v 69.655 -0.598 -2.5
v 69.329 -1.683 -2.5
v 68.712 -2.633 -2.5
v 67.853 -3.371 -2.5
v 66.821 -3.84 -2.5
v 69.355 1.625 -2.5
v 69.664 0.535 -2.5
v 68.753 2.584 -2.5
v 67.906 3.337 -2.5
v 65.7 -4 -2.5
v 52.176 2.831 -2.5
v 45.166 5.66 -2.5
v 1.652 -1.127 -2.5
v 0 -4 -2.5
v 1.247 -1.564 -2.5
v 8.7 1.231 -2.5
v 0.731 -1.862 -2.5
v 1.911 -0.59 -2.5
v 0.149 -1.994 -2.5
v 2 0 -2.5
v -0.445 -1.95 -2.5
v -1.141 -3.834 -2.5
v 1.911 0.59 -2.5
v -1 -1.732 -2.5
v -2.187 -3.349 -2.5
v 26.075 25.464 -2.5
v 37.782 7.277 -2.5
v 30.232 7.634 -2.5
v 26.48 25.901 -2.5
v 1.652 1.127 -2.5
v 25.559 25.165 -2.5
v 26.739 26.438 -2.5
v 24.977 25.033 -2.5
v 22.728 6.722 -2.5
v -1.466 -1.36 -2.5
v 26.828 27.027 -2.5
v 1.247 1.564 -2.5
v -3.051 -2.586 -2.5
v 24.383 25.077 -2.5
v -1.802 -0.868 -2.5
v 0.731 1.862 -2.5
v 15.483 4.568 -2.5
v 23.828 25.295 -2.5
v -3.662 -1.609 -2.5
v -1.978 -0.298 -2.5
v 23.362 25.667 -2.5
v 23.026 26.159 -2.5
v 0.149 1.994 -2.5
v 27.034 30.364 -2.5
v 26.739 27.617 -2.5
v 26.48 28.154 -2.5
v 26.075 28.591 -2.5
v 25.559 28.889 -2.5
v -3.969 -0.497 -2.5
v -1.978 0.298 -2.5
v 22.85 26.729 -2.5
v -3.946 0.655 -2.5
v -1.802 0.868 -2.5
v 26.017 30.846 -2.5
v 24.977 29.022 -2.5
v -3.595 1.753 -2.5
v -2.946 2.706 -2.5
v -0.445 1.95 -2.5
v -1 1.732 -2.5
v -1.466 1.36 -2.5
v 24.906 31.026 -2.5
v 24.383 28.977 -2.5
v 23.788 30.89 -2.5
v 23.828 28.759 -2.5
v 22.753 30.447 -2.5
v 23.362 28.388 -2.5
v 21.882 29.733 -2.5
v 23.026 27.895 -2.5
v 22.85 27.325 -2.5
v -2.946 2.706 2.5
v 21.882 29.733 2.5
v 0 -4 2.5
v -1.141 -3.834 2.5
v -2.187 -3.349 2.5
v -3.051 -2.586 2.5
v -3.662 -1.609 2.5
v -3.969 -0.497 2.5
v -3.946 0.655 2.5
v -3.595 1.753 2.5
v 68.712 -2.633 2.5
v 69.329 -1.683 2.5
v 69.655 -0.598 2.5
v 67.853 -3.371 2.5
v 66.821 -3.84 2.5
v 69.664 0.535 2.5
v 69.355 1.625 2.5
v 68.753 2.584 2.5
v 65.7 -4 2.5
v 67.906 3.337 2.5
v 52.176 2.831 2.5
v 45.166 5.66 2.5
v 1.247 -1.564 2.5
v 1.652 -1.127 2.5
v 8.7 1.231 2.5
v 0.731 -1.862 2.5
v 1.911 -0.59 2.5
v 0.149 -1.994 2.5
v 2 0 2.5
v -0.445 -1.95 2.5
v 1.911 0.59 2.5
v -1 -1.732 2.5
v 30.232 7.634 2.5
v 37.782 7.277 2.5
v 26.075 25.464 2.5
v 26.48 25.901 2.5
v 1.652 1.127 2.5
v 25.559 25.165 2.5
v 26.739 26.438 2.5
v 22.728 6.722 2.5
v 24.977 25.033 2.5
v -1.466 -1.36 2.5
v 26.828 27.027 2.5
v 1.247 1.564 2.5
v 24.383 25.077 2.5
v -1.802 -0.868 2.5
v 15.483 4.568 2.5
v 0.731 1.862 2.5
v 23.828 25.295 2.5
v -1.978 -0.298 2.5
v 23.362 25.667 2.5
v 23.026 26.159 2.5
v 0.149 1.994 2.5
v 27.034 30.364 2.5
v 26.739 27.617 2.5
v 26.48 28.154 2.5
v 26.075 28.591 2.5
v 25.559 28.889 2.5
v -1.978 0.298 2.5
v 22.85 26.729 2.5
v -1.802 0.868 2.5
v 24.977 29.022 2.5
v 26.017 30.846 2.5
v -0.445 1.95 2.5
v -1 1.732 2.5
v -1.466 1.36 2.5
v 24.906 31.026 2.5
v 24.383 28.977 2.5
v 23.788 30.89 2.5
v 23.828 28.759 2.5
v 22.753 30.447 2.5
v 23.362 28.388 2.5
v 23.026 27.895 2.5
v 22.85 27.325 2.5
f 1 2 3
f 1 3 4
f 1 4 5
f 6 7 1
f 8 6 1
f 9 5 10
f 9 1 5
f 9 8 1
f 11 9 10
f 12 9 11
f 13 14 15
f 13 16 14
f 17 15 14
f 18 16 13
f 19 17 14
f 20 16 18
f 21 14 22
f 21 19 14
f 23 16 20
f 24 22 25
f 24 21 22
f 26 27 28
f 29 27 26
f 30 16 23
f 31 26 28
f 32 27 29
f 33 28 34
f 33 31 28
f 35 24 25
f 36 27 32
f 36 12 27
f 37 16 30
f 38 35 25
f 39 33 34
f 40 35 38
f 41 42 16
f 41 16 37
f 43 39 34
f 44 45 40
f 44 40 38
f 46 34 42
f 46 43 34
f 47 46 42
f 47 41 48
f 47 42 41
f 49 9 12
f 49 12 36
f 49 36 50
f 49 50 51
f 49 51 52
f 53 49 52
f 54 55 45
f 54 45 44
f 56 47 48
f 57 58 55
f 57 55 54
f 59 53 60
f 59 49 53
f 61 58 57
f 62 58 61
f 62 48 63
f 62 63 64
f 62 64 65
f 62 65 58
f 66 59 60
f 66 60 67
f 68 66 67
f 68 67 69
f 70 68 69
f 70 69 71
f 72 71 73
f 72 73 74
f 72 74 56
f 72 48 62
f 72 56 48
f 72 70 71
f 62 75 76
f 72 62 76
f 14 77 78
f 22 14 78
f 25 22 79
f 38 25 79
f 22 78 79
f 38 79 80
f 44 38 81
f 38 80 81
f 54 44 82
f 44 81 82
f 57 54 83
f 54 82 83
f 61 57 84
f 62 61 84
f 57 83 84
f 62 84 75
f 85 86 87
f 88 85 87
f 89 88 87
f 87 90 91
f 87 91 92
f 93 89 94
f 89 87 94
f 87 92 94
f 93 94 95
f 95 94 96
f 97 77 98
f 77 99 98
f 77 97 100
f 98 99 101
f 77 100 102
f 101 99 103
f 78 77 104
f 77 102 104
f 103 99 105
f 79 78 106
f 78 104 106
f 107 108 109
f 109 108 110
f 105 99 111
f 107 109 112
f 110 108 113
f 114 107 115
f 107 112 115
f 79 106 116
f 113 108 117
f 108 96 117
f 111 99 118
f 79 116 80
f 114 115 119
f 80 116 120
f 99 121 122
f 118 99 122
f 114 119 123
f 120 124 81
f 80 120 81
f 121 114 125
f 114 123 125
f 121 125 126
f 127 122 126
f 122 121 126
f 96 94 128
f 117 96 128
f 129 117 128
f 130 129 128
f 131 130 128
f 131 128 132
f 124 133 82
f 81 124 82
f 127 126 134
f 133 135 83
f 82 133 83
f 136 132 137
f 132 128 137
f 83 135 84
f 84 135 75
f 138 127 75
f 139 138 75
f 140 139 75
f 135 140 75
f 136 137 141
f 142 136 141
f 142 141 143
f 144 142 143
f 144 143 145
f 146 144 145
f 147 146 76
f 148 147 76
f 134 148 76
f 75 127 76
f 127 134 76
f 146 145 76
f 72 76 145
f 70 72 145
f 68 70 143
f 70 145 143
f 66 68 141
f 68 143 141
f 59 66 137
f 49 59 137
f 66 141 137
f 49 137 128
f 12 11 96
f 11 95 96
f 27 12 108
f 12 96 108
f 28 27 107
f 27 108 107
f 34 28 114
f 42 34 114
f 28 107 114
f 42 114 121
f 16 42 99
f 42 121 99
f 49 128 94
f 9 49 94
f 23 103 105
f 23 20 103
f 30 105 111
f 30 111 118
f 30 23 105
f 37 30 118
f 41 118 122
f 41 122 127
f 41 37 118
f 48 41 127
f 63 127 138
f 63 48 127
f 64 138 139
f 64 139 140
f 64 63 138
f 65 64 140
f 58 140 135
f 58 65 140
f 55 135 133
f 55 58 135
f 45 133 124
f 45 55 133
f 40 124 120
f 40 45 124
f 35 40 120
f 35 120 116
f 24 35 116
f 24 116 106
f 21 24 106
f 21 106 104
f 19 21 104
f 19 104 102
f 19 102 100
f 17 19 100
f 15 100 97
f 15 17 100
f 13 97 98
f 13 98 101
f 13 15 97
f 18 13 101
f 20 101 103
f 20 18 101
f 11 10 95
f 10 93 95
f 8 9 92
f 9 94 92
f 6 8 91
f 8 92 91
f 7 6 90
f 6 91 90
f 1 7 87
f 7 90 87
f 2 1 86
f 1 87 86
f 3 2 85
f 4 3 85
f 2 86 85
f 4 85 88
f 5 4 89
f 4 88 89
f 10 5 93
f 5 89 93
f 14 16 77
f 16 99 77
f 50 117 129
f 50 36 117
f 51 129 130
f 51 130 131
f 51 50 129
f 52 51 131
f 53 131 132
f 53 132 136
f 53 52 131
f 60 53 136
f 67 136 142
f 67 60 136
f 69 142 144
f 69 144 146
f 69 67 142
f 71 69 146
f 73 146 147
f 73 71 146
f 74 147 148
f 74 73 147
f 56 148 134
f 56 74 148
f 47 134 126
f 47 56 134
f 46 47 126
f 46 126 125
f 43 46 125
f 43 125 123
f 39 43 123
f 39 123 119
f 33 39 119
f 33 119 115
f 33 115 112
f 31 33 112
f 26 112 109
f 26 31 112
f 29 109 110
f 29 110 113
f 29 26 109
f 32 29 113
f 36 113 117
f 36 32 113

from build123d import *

# Parameters (mm, degrees)
SKETCH_2_R      = 2
EXTRUDE_1_DEPTH = 2.5


with BuildPart() as part:
    # 草圖2 → 填料-伸長1 (new, symmetric)
    with BuildSketch(Plane.XY):
        with BuildLine():
            Line((27.034153101, 30.363667163), (67.906299219, 3.336501724))
            ThreePointArc((67.906299219, 3.336501724), (69.530535661, -1.151953364), (65.7, -4))
            Line((65.7, -4), (52.175653003, 2.831217066))
            ThreePointArc((52.175653003, 2.831217066), (30.231729467, 7.633890773), (8.700316547, 1.230788983))
            Line((8.700316547, 1.230788983), (0, -4))
            ThreePointArc((0, -4), (-3.662248796, -1.608705616), (-2.945740102, 2.706033121))
            Line((-2.945740102, 2.706033121), (21.882113779, 29.733198559))
            ThreePointArc((21.882113779, 29.733198559), (24.341987779, 30.997547553), (27.034153101, 30.363667163))
        make_face()
        Circle(SKETCH_2_R, mode=Mode.SUBTRACT)
        with Locations((24.827853881, 27.027165439)):
            Circle(SKETCH_2_R, mode=Mode.SUBTRACT)
    extrude(amount=EXTRUDE_1_DEPTH, both=True)


solid = part.part
